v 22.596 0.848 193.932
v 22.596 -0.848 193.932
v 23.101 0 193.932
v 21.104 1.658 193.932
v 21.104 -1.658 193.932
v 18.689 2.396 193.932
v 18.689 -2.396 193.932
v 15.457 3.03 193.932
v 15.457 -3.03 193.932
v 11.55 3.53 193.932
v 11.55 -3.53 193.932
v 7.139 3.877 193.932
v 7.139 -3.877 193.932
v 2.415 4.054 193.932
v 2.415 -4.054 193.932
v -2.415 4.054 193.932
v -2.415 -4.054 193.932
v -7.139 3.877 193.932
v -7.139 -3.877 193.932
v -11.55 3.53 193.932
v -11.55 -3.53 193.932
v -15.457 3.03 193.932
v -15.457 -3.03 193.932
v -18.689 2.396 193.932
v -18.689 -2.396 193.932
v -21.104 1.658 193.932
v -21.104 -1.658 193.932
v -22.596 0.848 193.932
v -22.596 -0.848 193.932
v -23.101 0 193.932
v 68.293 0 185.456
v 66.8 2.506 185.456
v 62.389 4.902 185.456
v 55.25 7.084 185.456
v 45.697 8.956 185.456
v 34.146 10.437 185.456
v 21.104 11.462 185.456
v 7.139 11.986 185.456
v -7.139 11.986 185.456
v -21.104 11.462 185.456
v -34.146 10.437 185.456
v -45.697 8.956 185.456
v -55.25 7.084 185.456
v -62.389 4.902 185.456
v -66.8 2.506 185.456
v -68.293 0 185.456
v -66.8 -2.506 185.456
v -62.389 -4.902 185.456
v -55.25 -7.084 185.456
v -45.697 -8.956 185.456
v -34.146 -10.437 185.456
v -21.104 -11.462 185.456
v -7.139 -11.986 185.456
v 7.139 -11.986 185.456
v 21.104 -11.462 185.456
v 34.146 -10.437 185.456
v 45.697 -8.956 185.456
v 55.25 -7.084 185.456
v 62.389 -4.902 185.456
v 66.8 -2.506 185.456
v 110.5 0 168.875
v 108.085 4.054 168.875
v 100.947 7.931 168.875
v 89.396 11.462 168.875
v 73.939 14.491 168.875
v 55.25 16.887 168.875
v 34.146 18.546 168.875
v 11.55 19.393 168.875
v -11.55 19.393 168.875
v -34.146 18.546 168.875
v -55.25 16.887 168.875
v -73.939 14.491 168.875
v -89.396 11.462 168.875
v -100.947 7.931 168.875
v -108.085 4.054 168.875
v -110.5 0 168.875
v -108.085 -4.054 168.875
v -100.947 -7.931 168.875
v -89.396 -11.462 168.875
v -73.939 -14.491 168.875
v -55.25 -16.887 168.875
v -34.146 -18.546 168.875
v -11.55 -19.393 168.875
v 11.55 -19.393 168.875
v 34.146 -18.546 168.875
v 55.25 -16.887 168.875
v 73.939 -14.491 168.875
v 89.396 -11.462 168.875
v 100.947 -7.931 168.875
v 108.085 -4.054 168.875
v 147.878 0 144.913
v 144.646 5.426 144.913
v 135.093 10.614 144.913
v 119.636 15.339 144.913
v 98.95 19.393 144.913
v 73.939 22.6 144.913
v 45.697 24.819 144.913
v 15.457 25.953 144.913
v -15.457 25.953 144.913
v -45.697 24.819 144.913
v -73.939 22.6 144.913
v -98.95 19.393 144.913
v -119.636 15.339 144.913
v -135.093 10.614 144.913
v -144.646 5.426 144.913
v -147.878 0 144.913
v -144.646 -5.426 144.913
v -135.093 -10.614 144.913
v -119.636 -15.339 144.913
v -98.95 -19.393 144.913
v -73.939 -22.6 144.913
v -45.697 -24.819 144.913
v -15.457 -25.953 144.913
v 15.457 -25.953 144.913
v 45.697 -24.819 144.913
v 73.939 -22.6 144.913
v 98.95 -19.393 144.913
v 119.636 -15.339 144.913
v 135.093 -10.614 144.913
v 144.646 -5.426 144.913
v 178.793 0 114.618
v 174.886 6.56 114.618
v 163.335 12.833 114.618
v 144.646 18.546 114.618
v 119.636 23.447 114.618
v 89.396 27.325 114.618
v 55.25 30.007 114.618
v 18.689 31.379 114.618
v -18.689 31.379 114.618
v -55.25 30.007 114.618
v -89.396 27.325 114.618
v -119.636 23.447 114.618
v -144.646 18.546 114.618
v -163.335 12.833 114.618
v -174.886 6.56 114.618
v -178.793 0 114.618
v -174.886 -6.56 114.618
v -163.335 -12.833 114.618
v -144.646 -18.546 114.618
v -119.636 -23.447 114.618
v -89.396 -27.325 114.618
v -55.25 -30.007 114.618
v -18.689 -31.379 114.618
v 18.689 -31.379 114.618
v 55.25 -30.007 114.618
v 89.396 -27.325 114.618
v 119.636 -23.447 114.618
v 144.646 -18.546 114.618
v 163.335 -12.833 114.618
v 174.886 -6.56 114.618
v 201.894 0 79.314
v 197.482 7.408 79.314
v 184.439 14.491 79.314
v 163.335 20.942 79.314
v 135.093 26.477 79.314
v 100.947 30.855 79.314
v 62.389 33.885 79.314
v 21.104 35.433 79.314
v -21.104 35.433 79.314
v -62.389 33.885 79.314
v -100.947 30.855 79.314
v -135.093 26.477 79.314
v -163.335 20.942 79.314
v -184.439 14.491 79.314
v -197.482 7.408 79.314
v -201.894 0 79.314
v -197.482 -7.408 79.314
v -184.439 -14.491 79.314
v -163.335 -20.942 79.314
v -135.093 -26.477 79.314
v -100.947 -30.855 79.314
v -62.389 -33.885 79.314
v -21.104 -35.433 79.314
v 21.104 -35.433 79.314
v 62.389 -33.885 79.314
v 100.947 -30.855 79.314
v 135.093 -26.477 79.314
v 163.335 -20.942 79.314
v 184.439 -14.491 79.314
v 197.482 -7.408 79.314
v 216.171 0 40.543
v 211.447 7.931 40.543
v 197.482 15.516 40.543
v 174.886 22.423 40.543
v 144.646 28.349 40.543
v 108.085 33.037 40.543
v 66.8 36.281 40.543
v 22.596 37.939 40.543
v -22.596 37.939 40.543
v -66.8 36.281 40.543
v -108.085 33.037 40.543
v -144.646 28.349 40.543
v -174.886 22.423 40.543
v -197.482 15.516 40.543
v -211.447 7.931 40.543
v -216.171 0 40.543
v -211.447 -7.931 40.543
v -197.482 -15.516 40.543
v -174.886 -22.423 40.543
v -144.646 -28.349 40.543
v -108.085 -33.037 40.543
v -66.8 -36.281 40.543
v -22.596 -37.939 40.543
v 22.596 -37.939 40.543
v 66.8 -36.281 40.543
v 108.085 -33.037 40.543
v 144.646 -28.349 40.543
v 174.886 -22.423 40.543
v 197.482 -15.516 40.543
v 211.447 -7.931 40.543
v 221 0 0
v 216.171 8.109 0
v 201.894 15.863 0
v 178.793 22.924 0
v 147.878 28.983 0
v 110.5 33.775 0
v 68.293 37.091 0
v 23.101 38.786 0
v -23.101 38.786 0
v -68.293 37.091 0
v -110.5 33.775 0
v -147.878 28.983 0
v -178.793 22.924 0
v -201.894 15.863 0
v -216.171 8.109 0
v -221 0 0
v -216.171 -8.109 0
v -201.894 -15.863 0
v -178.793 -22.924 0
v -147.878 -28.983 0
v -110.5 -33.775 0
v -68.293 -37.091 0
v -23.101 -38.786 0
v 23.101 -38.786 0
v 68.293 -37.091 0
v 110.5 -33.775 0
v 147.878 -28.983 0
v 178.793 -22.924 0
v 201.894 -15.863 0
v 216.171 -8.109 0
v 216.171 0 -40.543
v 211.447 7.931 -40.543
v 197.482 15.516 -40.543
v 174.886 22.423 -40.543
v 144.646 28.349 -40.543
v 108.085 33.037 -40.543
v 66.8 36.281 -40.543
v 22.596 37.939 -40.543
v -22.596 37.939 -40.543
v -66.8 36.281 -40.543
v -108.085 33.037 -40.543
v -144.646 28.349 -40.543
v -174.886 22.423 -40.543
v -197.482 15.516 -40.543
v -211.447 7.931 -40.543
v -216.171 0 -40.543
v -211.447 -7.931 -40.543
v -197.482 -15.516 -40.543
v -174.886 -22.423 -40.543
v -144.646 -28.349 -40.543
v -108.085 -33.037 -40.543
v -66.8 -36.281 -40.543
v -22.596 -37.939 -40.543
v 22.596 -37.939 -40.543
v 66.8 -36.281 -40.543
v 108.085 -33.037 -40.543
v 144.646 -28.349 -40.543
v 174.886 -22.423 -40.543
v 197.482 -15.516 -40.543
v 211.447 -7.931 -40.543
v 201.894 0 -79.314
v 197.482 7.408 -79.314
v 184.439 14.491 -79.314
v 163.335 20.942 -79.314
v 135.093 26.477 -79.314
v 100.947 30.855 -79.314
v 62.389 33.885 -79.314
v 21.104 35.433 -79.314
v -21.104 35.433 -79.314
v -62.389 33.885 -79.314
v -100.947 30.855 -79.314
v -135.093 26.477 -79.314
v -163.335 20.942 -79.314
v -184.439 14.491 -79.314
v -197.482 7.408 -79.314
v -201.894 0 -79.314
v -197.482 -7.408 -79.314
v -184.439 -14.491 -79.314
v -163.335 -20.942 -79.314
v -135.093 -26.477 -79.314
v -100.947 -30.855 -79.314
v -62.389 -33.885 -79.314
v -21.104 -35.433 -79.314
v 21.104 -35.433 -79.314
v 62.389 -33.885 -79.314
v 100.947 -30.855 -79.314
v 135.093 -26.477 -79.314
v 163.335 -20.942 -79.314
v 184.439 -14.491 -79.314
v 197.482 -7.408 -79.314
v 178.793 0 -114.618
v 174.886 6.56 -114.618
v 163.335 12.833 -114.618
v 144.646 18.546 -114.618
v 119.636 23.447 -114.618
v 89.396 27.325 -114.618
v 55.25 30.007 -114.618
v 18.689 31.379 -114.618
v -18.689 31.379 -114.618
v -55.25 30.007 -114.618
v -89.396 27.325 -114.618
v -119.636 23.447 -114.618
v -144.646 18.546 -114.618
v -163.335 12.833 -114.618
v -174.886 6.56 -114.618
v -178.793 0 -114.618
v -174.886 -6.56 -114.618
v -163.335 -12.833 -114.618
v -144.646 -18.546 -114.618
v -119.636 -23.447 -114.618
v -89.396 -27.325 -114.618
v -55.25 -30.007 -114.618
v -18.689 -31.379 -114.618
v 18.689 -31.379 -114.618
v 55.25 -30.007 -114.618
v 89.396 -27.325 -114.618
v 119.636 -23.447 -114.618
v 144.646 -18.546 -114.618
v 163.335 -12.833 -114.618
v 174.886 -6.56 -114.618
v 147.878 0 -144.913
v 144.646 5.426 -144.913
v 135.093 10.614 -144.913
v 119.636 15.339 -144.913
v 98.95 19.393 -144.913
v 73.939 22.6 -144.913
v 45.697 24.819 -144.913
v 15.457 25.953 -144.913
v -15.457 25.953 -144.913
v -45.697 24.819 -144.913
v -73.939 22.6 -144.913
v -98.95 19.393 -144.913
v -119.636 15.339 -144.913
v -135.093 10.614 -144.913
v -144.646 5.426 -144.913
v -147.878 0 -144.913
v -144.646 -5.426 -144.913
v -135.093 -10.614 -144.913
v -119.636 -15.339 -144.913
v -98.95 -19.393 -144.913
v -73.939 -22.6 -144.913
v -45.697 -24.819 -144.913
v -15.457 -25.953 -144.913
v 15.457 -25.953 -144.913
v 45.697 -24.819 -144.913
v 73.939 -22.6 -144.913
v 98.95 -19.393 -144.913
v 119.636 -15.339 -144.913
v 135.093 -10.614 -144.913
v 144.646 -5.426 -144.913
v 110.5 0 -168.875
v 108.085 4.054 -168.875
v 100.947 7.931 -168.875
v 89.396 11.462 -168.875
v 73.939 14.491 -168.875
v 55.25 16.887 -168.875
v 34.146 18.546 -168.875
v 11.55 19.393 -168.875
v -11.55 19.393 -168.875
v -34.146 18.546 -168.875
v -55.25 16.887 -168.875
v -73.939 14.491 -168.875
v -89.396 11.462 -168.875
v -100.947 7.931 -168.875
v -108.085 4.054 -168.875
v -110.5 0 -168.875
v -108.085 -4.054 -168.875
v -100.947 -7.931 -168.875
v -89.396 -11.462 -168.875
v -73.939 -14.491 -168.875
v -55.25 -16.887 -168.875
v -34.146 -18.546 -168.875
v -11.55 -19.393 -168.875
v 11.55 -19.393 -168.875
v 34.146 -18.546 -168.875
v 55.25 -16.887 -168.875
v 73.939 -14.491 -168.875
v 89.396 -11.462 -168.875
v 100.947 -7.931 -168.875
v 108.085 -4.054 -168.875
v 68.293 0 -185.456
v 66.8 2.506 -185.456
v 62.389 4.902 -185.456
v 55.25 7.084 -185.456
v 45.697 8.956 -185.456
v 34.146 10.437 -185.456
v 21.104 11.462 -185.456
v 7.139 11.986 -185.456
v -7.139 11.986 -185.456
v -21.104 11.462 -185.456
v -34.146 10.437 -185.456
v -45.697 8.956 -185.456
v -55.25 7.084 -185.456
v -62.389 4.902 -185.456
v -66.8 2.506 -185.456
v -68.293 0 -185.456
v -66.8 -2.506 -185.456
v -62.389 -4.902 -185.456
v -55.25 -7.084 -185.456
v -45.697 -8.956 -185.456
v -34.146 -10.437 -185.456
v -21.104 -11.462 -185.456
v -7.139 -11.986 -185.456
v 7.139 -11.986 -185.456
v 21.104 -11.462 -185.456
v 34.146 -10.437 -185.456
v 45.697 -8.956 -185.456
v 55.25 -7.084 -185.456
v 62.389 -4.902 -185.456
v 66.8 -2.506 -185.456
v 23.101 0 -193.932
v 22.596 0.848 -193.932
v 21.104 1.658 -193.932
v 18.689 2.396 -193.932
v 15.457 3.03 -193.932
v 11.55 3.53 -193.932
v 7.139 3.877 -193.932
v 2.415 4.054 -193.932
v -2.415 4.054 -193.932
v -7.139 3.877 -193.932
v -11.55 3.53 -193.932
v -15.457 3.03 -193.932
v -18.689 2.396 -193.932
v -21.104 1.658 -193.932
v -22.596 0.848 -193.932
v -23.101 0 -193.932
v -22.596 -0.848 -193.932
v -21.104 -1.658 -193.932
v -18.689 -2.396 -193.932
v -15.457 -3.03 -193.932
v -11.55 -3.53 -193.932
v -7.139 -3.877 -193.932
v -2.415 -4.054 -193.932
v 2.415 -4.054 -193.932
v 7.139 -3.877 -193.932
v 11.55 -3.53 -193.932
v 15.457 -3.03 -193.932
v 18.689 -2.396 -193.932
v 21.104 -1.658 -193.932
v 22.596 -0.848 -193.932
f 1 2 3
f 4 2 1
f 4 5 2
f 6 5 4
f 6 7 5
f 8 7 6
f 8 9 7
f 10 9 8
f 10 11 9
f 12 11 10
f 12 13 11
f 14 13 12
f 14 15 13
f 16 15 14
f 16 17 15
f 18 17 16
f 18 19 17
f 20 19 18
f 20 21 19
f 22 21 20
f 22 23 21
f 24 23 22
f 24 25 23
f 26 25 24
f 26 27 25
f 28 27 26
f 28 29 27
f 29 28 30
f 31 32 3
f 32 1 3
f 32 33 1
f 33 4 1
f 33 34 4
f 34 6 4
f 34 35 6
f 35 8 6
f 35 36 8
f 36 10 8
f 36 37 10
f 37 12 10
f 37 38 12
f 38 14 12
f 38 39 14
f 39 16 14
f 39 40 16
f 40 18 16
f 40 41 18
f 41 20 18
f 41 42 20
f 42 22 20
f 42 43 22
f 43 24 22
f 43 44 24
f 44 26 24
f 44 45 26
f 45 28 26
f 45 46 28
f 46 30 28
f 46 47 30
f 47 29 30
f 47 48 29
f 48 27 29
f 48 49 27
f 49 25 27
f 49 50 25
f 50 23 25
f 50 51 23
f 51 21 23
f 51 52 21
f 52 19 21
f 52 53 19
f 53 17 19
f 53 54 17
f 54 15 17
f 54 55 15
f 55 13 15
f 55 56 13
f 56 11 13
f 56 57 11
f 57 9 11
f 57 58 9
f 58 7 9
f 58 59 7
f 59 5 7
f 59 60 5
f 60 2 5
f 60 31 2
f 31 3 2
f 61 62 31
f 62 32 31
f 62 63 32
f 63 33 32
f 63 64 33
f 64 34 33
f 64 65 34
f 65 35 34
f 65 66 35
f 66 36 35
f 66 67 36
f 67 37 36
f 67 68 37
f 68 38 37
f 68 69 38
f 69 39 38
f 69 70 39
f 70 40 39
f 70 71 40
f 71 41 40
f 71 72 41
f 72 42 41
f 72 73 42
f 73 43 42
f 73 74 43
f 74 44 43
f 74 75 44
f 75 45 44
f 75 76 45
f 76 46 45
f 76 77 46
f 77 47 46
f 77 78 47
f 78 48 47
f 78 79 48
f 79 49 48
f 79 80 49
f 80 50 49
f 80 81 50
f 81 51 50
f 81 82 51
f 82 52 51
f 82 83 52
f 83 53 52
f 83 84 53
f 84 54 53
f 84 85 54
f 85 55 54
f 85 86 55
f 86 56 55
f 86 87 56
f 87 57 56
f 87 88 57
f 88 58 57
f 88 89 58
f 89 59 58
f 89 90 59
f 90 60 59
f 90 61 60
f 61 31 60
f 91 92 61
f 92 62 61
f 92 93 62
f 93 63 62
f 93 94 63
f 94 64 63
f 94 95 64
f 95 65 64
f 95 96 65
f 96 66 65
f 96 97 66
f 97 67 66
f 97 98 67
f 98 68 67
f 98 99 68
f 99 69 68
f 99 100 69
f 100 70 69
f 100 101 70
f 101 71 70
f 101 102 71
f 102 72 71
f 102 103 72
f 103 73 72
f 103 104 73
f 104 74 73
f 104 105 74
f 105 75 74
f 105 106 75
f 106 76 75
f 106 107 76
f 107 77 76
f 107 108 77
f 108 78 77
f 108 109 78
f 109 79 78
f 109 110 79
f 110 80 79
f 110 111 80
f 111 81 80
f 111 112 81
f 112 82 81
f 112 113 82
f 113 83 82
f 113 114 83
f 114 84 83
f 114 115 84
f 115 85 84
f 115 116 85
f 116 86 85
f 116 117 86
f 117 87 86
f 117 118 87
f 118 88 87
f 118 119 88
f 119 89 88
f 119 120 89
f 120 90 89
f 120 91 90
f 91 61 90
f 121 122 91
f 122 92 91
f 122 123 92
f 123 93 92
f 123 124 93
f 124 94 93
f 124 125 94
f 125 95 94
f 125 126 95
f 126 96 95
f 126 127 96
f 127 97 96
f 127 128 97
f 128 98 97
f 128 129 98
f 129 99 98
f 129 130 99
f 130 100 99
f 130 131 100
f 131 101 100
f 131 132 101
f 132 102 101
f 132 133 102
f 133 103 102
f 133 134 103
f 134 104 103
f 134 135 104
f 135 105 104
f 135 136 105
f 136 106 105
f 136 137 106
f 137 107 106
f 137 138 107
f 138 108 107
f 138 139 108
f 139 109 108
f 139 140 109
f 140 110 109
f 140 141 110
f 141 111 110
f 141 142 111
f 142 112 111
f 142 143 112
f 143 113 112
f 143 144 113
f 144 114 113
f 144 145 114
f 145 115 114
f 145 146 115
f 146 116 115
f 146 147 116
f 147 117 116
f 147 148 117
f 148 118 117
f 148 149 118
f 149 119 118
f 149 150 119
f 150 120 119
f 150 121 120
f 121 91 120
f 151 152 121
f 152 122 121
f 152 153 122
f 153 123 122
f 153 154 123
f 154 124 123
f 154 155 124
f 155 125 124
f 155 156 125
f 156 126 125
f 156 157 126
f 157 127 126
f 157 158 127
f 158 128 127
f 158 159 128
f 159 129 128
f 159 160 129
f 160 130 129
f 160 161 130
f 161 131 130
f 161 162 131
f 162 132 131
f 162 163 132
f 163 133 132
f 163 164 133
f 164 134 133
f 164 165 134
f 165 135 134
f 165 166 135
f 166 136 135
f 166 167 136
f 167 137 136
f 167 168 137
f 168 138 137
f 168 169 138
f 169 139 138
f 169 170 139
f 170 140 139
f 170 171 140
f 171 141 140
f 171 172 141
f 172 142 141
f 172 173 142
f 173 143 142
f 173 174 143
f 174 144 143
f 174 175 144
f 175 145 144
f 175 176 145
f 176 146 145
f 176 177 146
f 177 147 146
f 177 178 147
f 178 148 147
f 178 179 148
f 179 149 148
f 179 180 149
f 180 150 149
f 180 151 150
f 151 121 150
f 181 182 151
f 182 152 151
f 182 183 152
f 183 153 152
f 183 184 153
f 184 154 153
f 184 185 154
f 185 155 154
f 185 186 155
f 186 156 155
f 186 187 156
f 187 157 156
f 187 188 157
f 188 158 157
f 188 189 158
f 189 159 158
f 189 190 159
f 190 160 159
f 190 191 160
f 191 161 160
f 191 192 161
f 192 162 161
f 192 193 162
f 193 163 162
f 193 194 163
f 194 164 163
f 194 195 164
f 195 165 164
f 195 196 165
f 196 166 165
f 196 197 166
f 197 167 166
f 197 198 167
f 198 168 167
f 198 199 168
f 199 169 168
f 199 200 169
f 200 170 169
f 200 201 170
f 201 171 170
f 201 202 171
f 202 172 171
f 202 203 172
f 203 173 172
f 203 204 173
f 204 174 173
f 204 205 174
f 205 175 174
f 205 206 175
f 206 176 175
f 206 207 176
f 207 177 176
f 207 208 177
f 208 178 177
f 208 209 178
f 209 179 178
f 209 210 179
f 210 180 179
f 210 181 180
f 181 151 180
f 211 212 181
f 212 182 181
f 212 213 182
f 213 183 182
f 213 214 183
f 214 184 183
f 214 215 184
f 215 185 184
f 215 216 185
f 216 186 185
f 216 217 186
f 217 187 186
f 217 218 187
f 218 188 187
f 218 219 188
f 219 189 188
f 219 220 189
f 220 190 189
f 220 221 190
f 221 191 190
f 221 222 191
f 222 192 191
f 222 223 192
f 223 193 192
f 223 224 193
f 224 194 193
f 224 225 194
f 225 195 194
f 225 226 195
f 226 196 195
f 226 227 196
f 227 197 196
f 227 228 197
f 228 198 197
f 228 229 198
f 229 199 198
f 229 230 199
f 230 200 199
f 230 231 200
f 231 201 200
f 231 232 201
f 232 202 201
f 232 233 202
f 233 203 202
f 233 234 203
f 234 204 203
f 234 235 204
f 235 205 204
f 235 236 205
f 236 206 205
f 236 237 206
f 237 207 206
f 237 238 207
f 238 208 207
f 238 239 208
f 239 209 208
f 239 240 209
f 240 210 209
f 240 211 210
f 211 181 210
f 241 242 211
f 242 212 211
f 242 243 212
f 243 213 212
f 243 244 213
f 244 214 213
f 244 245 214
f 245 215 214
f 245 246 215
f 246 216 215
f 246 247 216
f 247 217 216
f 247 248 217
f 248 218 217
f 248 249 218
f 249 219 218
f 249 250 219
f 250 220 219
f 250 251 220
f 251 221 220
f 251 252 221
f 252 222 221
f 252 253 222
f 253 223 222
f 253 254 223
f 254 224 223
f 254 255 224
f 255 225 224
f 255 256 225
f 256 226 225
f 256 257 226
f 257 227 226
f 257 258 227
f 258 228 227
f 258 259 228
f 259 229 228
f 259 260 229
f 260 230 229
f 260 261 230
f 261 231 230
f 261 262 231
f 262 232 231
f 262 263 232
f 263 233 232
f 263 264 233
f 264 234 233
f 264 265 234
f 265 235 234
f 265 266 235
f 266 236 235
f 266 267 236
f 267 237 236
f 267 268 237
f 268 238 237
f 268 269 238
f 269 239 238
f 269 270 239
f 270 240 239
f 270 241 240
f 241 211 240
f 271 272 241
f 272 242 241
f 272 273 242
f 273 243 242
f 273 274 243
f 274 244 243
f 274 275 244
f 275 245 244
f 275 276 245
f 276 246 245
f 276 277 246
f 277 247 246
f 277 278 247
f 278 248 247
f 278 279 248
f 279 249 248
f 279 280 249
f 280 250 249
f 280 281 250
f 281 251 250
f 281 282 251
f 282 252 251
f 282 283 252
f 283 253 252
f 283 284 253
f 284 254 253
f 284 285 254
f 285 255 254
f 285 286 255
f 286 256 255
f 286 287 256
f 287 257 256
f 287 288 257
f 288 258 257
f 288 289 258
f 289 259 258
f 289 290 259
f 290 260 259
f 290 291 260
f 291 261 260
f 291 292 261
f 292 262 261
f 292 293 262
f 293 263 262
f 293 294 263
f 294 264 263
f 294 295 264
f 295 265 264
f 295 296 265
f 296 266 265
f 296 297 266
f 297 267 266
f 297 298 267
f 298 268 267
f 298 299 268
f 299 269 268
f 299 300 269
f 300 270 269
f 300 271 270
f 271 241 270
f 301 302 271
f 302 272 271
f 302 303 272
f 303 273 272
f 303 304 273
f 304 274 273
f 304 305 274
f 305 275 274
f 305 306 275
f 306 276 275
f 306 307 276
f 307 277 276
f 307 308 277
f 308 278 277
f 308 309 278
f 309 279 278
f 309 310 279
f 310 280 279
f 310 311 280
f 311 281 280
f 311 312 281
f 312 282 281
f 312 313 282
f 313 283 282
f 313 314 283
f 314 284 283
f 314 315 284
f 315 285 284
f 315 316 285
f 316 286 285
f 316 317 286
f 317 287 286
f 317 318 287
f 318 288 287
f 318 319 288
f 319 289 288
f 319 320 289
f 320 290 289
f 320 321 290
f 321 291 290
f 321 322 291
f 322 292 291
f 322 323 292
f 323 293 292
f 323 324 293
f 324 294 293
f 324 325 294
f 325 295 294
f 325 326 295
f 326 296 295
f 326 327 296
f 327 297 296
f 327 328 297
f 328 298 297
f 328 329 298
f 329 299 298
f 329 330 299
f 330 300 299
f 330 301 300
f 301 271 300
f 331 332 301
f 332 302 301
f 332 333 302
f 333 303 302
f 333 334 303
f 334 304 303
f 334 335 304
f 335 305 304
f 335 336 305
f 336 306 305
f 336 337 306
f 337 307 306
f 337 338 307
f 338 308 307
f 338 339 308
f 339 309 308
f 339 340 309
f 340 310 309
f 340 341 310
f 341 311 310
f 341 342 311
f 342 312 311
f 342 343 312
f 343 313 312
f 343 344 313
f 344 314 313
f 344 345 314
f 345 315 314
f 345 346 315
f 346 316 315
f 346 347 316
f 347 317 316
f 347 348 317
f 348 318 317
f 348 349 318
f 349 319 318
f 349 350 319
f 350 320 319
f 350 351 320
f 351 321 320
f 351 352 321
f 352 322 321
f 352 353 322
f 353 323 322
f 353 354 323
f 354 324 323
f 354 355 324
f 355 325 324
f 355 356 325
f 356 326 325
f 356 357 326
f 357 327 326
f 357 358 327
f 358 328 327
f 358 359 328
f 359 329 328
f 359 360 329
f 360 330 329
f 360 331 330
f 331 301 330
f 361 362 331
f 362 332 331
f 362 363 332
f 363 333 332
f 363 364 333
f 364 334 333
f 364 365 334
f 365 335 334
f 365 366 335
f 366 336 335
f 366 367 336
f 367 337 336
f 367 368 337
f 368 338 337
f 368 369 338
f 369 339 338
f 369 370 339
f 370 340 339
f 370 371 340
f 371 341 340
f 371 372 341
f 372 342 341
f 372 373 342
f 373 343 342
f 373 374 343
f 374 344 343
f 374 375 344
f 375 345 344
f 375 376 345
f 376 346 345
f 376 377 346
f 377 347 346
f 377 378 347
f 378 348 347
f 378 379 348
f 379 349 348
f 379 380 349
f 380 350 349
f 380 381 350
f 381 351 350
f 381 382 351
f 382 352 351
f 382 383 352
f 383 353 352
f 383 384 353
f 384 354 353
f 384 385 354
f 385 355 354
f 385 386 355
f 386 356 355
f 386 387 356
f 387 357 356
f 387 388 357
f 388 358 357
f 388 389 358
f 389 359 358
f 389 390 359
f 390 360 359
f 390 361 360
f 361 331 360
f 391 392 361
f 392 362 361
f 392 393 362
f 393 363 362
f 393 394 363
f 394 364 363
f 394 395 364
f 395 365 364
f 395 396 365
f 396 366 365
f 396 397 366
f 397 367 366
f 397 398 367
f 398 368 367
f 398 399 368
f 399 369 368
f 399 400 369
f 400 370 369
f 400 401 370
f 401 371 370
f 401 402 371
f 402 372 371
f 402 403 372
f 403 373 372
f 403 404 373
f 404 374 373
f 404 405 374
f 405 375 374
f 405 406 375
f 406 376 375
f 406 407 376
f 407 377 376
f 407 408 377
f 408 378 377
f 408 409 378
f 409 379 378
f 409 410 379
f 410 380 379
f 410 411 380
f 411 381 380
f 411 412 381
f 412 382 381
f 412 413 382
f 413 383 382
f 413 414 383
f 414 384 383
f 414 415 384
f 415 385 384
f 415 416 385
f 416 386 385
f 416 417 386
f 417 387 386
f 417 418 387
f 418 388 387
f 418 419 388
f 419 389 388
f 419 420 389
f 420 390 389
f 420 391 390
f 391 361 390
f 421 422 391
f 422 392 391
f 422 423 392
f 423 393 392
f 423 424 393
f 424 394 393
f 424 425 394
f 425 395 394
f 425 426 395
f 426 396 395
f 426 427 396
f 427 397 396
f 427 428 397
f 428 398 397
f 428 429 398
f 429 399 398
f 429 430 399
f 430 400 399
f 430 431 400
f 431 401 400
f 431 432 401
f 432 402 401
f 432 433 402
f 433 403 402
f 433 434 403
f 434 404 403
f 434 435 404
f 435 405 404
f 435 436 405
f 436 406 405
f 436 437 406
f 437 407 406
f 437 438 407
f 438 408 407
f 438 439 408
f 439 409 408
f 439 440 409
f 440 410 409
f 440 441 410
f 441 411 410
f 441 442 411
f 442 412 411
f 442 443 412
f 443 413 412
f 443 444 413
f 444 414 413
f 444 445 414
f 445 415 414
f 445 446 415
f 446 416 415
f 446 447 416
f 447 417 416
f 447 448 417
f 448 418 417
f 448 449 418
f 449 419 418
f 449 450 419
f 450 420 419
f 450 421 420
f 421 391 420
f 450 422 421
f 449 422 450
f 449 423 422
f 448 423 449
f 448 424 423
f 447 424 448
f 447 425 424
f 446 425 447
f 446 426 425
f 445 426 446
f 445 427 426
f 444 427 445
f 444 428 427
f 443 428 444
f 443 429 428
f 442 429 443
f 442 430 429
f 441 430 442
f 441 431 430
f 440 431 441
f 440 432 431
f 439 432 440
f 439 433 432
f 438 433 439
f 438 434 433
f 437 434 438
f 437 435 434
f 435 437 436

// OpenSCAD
// Generated by SolidPython 1.0.1 on 2020-07-29 00:46:52


scale(v = [17, 3, 15]) {
	sphere(r = 13);
}
/***********************************************
*********      SolidPython code:      **********
************************************************
 
# import packages: SolidPython
from solid import *
from solid.utils import *
from itertools import chain, combinations, permutations


class Resize:

    def __init__(self, scad_file):
        self.scad_file = scad_file
        #self.scad_file = import_scad(scad_file)
        # cone/cylinder param:
        self.r1 = 0
        self.r2 = 0
        self.h = 0
        # rectangular prism param:
        self.w = 0
        self.l = 0
        # ellipse param:
        self.r = 0

    # import OpenScad code (file name corresponds to shape)


    # classify shape + parameters
    def assign(self, param1, param2, param3):
        if self.scad_file == 'cone.scad':
            self.r1 = param1
            self.r2 = param2
            self.h = param3
        elif self.scad_file == 'cylinder.scad':
            self.r1 = param1
            self.r2 = param2
            self.h = param3
        elif self.scad_file == 'rectangularPrism.scad':
            self.h = param1
            self.l = param2
            self.w = param3
        else:
            self.r = param1
            self.h = param2

    # resize parameters
    def iterate(self):
        x = range(3, 20, 2)
        i = 1
        if self.scad_file == 'cone.scad':
            tempList = list(permutations(x, 2))
            for temp in tempList:
                param1 = temp[0]
                param2 = temp[1]
                filepath = 'produced_scad_files/' + 'cone' + str(param1) + '_' + str(param2) + '_' + '.scad'
                scad_render_to_file(cylinder(h=param1, r1=param2, r2=0), filepath)

        elif self.scad_file == 'cylinder.scad':
            tempList = list(permutations(x, 3))
            for temp in tempList:
                param1 = temp[0]
                param2 = temp[1]
                filepath = 'produced_scad_files/' + 'cylinder' + str(param1) + '_' + str(param2) + '_' + '.scad'
                scad_render_to_file(cylinder(h=param1, r1=param2, r2=param2), filepath)

        elif self.scad_file == 'rectangularPrism.scad':
            tempList = list(permutations(x, 3))
            for temp in tempList:
                param1 = temp[0]
                param2 = temp[1]
                param3 = temp[2]
                filepath = 'produced_scad_files/' + 'rectangularPrism' + str(param1) + '_' + str(param2) + '_' + str(
                    param3) + '.scad'
                scad_render_to_file(cube(size=(param1, param2, param3)), filepath)

        elif self.scad_file == 'ellipse.scad':
            tempList = list(permutations(x, 4))
            for temp in tempList:
                param1 = temp[0]
                param2 = temp[1]
                param3 = temp[2]
                param4 = temp[3]
                filepath = 'produced_scad_files/' + 'ellipse' + str(param1) + '_' + str(param2) + '_' + str(param3) + '_' + str(param4) + '.scad'
                scad_render_to_file(scale([param1, param2, param3])(sphere(r=param4)), filepath)

    def render_to_scadfile(self):
        scad_render_to_file(scad, 'example.scad') 
 
************************************************/
